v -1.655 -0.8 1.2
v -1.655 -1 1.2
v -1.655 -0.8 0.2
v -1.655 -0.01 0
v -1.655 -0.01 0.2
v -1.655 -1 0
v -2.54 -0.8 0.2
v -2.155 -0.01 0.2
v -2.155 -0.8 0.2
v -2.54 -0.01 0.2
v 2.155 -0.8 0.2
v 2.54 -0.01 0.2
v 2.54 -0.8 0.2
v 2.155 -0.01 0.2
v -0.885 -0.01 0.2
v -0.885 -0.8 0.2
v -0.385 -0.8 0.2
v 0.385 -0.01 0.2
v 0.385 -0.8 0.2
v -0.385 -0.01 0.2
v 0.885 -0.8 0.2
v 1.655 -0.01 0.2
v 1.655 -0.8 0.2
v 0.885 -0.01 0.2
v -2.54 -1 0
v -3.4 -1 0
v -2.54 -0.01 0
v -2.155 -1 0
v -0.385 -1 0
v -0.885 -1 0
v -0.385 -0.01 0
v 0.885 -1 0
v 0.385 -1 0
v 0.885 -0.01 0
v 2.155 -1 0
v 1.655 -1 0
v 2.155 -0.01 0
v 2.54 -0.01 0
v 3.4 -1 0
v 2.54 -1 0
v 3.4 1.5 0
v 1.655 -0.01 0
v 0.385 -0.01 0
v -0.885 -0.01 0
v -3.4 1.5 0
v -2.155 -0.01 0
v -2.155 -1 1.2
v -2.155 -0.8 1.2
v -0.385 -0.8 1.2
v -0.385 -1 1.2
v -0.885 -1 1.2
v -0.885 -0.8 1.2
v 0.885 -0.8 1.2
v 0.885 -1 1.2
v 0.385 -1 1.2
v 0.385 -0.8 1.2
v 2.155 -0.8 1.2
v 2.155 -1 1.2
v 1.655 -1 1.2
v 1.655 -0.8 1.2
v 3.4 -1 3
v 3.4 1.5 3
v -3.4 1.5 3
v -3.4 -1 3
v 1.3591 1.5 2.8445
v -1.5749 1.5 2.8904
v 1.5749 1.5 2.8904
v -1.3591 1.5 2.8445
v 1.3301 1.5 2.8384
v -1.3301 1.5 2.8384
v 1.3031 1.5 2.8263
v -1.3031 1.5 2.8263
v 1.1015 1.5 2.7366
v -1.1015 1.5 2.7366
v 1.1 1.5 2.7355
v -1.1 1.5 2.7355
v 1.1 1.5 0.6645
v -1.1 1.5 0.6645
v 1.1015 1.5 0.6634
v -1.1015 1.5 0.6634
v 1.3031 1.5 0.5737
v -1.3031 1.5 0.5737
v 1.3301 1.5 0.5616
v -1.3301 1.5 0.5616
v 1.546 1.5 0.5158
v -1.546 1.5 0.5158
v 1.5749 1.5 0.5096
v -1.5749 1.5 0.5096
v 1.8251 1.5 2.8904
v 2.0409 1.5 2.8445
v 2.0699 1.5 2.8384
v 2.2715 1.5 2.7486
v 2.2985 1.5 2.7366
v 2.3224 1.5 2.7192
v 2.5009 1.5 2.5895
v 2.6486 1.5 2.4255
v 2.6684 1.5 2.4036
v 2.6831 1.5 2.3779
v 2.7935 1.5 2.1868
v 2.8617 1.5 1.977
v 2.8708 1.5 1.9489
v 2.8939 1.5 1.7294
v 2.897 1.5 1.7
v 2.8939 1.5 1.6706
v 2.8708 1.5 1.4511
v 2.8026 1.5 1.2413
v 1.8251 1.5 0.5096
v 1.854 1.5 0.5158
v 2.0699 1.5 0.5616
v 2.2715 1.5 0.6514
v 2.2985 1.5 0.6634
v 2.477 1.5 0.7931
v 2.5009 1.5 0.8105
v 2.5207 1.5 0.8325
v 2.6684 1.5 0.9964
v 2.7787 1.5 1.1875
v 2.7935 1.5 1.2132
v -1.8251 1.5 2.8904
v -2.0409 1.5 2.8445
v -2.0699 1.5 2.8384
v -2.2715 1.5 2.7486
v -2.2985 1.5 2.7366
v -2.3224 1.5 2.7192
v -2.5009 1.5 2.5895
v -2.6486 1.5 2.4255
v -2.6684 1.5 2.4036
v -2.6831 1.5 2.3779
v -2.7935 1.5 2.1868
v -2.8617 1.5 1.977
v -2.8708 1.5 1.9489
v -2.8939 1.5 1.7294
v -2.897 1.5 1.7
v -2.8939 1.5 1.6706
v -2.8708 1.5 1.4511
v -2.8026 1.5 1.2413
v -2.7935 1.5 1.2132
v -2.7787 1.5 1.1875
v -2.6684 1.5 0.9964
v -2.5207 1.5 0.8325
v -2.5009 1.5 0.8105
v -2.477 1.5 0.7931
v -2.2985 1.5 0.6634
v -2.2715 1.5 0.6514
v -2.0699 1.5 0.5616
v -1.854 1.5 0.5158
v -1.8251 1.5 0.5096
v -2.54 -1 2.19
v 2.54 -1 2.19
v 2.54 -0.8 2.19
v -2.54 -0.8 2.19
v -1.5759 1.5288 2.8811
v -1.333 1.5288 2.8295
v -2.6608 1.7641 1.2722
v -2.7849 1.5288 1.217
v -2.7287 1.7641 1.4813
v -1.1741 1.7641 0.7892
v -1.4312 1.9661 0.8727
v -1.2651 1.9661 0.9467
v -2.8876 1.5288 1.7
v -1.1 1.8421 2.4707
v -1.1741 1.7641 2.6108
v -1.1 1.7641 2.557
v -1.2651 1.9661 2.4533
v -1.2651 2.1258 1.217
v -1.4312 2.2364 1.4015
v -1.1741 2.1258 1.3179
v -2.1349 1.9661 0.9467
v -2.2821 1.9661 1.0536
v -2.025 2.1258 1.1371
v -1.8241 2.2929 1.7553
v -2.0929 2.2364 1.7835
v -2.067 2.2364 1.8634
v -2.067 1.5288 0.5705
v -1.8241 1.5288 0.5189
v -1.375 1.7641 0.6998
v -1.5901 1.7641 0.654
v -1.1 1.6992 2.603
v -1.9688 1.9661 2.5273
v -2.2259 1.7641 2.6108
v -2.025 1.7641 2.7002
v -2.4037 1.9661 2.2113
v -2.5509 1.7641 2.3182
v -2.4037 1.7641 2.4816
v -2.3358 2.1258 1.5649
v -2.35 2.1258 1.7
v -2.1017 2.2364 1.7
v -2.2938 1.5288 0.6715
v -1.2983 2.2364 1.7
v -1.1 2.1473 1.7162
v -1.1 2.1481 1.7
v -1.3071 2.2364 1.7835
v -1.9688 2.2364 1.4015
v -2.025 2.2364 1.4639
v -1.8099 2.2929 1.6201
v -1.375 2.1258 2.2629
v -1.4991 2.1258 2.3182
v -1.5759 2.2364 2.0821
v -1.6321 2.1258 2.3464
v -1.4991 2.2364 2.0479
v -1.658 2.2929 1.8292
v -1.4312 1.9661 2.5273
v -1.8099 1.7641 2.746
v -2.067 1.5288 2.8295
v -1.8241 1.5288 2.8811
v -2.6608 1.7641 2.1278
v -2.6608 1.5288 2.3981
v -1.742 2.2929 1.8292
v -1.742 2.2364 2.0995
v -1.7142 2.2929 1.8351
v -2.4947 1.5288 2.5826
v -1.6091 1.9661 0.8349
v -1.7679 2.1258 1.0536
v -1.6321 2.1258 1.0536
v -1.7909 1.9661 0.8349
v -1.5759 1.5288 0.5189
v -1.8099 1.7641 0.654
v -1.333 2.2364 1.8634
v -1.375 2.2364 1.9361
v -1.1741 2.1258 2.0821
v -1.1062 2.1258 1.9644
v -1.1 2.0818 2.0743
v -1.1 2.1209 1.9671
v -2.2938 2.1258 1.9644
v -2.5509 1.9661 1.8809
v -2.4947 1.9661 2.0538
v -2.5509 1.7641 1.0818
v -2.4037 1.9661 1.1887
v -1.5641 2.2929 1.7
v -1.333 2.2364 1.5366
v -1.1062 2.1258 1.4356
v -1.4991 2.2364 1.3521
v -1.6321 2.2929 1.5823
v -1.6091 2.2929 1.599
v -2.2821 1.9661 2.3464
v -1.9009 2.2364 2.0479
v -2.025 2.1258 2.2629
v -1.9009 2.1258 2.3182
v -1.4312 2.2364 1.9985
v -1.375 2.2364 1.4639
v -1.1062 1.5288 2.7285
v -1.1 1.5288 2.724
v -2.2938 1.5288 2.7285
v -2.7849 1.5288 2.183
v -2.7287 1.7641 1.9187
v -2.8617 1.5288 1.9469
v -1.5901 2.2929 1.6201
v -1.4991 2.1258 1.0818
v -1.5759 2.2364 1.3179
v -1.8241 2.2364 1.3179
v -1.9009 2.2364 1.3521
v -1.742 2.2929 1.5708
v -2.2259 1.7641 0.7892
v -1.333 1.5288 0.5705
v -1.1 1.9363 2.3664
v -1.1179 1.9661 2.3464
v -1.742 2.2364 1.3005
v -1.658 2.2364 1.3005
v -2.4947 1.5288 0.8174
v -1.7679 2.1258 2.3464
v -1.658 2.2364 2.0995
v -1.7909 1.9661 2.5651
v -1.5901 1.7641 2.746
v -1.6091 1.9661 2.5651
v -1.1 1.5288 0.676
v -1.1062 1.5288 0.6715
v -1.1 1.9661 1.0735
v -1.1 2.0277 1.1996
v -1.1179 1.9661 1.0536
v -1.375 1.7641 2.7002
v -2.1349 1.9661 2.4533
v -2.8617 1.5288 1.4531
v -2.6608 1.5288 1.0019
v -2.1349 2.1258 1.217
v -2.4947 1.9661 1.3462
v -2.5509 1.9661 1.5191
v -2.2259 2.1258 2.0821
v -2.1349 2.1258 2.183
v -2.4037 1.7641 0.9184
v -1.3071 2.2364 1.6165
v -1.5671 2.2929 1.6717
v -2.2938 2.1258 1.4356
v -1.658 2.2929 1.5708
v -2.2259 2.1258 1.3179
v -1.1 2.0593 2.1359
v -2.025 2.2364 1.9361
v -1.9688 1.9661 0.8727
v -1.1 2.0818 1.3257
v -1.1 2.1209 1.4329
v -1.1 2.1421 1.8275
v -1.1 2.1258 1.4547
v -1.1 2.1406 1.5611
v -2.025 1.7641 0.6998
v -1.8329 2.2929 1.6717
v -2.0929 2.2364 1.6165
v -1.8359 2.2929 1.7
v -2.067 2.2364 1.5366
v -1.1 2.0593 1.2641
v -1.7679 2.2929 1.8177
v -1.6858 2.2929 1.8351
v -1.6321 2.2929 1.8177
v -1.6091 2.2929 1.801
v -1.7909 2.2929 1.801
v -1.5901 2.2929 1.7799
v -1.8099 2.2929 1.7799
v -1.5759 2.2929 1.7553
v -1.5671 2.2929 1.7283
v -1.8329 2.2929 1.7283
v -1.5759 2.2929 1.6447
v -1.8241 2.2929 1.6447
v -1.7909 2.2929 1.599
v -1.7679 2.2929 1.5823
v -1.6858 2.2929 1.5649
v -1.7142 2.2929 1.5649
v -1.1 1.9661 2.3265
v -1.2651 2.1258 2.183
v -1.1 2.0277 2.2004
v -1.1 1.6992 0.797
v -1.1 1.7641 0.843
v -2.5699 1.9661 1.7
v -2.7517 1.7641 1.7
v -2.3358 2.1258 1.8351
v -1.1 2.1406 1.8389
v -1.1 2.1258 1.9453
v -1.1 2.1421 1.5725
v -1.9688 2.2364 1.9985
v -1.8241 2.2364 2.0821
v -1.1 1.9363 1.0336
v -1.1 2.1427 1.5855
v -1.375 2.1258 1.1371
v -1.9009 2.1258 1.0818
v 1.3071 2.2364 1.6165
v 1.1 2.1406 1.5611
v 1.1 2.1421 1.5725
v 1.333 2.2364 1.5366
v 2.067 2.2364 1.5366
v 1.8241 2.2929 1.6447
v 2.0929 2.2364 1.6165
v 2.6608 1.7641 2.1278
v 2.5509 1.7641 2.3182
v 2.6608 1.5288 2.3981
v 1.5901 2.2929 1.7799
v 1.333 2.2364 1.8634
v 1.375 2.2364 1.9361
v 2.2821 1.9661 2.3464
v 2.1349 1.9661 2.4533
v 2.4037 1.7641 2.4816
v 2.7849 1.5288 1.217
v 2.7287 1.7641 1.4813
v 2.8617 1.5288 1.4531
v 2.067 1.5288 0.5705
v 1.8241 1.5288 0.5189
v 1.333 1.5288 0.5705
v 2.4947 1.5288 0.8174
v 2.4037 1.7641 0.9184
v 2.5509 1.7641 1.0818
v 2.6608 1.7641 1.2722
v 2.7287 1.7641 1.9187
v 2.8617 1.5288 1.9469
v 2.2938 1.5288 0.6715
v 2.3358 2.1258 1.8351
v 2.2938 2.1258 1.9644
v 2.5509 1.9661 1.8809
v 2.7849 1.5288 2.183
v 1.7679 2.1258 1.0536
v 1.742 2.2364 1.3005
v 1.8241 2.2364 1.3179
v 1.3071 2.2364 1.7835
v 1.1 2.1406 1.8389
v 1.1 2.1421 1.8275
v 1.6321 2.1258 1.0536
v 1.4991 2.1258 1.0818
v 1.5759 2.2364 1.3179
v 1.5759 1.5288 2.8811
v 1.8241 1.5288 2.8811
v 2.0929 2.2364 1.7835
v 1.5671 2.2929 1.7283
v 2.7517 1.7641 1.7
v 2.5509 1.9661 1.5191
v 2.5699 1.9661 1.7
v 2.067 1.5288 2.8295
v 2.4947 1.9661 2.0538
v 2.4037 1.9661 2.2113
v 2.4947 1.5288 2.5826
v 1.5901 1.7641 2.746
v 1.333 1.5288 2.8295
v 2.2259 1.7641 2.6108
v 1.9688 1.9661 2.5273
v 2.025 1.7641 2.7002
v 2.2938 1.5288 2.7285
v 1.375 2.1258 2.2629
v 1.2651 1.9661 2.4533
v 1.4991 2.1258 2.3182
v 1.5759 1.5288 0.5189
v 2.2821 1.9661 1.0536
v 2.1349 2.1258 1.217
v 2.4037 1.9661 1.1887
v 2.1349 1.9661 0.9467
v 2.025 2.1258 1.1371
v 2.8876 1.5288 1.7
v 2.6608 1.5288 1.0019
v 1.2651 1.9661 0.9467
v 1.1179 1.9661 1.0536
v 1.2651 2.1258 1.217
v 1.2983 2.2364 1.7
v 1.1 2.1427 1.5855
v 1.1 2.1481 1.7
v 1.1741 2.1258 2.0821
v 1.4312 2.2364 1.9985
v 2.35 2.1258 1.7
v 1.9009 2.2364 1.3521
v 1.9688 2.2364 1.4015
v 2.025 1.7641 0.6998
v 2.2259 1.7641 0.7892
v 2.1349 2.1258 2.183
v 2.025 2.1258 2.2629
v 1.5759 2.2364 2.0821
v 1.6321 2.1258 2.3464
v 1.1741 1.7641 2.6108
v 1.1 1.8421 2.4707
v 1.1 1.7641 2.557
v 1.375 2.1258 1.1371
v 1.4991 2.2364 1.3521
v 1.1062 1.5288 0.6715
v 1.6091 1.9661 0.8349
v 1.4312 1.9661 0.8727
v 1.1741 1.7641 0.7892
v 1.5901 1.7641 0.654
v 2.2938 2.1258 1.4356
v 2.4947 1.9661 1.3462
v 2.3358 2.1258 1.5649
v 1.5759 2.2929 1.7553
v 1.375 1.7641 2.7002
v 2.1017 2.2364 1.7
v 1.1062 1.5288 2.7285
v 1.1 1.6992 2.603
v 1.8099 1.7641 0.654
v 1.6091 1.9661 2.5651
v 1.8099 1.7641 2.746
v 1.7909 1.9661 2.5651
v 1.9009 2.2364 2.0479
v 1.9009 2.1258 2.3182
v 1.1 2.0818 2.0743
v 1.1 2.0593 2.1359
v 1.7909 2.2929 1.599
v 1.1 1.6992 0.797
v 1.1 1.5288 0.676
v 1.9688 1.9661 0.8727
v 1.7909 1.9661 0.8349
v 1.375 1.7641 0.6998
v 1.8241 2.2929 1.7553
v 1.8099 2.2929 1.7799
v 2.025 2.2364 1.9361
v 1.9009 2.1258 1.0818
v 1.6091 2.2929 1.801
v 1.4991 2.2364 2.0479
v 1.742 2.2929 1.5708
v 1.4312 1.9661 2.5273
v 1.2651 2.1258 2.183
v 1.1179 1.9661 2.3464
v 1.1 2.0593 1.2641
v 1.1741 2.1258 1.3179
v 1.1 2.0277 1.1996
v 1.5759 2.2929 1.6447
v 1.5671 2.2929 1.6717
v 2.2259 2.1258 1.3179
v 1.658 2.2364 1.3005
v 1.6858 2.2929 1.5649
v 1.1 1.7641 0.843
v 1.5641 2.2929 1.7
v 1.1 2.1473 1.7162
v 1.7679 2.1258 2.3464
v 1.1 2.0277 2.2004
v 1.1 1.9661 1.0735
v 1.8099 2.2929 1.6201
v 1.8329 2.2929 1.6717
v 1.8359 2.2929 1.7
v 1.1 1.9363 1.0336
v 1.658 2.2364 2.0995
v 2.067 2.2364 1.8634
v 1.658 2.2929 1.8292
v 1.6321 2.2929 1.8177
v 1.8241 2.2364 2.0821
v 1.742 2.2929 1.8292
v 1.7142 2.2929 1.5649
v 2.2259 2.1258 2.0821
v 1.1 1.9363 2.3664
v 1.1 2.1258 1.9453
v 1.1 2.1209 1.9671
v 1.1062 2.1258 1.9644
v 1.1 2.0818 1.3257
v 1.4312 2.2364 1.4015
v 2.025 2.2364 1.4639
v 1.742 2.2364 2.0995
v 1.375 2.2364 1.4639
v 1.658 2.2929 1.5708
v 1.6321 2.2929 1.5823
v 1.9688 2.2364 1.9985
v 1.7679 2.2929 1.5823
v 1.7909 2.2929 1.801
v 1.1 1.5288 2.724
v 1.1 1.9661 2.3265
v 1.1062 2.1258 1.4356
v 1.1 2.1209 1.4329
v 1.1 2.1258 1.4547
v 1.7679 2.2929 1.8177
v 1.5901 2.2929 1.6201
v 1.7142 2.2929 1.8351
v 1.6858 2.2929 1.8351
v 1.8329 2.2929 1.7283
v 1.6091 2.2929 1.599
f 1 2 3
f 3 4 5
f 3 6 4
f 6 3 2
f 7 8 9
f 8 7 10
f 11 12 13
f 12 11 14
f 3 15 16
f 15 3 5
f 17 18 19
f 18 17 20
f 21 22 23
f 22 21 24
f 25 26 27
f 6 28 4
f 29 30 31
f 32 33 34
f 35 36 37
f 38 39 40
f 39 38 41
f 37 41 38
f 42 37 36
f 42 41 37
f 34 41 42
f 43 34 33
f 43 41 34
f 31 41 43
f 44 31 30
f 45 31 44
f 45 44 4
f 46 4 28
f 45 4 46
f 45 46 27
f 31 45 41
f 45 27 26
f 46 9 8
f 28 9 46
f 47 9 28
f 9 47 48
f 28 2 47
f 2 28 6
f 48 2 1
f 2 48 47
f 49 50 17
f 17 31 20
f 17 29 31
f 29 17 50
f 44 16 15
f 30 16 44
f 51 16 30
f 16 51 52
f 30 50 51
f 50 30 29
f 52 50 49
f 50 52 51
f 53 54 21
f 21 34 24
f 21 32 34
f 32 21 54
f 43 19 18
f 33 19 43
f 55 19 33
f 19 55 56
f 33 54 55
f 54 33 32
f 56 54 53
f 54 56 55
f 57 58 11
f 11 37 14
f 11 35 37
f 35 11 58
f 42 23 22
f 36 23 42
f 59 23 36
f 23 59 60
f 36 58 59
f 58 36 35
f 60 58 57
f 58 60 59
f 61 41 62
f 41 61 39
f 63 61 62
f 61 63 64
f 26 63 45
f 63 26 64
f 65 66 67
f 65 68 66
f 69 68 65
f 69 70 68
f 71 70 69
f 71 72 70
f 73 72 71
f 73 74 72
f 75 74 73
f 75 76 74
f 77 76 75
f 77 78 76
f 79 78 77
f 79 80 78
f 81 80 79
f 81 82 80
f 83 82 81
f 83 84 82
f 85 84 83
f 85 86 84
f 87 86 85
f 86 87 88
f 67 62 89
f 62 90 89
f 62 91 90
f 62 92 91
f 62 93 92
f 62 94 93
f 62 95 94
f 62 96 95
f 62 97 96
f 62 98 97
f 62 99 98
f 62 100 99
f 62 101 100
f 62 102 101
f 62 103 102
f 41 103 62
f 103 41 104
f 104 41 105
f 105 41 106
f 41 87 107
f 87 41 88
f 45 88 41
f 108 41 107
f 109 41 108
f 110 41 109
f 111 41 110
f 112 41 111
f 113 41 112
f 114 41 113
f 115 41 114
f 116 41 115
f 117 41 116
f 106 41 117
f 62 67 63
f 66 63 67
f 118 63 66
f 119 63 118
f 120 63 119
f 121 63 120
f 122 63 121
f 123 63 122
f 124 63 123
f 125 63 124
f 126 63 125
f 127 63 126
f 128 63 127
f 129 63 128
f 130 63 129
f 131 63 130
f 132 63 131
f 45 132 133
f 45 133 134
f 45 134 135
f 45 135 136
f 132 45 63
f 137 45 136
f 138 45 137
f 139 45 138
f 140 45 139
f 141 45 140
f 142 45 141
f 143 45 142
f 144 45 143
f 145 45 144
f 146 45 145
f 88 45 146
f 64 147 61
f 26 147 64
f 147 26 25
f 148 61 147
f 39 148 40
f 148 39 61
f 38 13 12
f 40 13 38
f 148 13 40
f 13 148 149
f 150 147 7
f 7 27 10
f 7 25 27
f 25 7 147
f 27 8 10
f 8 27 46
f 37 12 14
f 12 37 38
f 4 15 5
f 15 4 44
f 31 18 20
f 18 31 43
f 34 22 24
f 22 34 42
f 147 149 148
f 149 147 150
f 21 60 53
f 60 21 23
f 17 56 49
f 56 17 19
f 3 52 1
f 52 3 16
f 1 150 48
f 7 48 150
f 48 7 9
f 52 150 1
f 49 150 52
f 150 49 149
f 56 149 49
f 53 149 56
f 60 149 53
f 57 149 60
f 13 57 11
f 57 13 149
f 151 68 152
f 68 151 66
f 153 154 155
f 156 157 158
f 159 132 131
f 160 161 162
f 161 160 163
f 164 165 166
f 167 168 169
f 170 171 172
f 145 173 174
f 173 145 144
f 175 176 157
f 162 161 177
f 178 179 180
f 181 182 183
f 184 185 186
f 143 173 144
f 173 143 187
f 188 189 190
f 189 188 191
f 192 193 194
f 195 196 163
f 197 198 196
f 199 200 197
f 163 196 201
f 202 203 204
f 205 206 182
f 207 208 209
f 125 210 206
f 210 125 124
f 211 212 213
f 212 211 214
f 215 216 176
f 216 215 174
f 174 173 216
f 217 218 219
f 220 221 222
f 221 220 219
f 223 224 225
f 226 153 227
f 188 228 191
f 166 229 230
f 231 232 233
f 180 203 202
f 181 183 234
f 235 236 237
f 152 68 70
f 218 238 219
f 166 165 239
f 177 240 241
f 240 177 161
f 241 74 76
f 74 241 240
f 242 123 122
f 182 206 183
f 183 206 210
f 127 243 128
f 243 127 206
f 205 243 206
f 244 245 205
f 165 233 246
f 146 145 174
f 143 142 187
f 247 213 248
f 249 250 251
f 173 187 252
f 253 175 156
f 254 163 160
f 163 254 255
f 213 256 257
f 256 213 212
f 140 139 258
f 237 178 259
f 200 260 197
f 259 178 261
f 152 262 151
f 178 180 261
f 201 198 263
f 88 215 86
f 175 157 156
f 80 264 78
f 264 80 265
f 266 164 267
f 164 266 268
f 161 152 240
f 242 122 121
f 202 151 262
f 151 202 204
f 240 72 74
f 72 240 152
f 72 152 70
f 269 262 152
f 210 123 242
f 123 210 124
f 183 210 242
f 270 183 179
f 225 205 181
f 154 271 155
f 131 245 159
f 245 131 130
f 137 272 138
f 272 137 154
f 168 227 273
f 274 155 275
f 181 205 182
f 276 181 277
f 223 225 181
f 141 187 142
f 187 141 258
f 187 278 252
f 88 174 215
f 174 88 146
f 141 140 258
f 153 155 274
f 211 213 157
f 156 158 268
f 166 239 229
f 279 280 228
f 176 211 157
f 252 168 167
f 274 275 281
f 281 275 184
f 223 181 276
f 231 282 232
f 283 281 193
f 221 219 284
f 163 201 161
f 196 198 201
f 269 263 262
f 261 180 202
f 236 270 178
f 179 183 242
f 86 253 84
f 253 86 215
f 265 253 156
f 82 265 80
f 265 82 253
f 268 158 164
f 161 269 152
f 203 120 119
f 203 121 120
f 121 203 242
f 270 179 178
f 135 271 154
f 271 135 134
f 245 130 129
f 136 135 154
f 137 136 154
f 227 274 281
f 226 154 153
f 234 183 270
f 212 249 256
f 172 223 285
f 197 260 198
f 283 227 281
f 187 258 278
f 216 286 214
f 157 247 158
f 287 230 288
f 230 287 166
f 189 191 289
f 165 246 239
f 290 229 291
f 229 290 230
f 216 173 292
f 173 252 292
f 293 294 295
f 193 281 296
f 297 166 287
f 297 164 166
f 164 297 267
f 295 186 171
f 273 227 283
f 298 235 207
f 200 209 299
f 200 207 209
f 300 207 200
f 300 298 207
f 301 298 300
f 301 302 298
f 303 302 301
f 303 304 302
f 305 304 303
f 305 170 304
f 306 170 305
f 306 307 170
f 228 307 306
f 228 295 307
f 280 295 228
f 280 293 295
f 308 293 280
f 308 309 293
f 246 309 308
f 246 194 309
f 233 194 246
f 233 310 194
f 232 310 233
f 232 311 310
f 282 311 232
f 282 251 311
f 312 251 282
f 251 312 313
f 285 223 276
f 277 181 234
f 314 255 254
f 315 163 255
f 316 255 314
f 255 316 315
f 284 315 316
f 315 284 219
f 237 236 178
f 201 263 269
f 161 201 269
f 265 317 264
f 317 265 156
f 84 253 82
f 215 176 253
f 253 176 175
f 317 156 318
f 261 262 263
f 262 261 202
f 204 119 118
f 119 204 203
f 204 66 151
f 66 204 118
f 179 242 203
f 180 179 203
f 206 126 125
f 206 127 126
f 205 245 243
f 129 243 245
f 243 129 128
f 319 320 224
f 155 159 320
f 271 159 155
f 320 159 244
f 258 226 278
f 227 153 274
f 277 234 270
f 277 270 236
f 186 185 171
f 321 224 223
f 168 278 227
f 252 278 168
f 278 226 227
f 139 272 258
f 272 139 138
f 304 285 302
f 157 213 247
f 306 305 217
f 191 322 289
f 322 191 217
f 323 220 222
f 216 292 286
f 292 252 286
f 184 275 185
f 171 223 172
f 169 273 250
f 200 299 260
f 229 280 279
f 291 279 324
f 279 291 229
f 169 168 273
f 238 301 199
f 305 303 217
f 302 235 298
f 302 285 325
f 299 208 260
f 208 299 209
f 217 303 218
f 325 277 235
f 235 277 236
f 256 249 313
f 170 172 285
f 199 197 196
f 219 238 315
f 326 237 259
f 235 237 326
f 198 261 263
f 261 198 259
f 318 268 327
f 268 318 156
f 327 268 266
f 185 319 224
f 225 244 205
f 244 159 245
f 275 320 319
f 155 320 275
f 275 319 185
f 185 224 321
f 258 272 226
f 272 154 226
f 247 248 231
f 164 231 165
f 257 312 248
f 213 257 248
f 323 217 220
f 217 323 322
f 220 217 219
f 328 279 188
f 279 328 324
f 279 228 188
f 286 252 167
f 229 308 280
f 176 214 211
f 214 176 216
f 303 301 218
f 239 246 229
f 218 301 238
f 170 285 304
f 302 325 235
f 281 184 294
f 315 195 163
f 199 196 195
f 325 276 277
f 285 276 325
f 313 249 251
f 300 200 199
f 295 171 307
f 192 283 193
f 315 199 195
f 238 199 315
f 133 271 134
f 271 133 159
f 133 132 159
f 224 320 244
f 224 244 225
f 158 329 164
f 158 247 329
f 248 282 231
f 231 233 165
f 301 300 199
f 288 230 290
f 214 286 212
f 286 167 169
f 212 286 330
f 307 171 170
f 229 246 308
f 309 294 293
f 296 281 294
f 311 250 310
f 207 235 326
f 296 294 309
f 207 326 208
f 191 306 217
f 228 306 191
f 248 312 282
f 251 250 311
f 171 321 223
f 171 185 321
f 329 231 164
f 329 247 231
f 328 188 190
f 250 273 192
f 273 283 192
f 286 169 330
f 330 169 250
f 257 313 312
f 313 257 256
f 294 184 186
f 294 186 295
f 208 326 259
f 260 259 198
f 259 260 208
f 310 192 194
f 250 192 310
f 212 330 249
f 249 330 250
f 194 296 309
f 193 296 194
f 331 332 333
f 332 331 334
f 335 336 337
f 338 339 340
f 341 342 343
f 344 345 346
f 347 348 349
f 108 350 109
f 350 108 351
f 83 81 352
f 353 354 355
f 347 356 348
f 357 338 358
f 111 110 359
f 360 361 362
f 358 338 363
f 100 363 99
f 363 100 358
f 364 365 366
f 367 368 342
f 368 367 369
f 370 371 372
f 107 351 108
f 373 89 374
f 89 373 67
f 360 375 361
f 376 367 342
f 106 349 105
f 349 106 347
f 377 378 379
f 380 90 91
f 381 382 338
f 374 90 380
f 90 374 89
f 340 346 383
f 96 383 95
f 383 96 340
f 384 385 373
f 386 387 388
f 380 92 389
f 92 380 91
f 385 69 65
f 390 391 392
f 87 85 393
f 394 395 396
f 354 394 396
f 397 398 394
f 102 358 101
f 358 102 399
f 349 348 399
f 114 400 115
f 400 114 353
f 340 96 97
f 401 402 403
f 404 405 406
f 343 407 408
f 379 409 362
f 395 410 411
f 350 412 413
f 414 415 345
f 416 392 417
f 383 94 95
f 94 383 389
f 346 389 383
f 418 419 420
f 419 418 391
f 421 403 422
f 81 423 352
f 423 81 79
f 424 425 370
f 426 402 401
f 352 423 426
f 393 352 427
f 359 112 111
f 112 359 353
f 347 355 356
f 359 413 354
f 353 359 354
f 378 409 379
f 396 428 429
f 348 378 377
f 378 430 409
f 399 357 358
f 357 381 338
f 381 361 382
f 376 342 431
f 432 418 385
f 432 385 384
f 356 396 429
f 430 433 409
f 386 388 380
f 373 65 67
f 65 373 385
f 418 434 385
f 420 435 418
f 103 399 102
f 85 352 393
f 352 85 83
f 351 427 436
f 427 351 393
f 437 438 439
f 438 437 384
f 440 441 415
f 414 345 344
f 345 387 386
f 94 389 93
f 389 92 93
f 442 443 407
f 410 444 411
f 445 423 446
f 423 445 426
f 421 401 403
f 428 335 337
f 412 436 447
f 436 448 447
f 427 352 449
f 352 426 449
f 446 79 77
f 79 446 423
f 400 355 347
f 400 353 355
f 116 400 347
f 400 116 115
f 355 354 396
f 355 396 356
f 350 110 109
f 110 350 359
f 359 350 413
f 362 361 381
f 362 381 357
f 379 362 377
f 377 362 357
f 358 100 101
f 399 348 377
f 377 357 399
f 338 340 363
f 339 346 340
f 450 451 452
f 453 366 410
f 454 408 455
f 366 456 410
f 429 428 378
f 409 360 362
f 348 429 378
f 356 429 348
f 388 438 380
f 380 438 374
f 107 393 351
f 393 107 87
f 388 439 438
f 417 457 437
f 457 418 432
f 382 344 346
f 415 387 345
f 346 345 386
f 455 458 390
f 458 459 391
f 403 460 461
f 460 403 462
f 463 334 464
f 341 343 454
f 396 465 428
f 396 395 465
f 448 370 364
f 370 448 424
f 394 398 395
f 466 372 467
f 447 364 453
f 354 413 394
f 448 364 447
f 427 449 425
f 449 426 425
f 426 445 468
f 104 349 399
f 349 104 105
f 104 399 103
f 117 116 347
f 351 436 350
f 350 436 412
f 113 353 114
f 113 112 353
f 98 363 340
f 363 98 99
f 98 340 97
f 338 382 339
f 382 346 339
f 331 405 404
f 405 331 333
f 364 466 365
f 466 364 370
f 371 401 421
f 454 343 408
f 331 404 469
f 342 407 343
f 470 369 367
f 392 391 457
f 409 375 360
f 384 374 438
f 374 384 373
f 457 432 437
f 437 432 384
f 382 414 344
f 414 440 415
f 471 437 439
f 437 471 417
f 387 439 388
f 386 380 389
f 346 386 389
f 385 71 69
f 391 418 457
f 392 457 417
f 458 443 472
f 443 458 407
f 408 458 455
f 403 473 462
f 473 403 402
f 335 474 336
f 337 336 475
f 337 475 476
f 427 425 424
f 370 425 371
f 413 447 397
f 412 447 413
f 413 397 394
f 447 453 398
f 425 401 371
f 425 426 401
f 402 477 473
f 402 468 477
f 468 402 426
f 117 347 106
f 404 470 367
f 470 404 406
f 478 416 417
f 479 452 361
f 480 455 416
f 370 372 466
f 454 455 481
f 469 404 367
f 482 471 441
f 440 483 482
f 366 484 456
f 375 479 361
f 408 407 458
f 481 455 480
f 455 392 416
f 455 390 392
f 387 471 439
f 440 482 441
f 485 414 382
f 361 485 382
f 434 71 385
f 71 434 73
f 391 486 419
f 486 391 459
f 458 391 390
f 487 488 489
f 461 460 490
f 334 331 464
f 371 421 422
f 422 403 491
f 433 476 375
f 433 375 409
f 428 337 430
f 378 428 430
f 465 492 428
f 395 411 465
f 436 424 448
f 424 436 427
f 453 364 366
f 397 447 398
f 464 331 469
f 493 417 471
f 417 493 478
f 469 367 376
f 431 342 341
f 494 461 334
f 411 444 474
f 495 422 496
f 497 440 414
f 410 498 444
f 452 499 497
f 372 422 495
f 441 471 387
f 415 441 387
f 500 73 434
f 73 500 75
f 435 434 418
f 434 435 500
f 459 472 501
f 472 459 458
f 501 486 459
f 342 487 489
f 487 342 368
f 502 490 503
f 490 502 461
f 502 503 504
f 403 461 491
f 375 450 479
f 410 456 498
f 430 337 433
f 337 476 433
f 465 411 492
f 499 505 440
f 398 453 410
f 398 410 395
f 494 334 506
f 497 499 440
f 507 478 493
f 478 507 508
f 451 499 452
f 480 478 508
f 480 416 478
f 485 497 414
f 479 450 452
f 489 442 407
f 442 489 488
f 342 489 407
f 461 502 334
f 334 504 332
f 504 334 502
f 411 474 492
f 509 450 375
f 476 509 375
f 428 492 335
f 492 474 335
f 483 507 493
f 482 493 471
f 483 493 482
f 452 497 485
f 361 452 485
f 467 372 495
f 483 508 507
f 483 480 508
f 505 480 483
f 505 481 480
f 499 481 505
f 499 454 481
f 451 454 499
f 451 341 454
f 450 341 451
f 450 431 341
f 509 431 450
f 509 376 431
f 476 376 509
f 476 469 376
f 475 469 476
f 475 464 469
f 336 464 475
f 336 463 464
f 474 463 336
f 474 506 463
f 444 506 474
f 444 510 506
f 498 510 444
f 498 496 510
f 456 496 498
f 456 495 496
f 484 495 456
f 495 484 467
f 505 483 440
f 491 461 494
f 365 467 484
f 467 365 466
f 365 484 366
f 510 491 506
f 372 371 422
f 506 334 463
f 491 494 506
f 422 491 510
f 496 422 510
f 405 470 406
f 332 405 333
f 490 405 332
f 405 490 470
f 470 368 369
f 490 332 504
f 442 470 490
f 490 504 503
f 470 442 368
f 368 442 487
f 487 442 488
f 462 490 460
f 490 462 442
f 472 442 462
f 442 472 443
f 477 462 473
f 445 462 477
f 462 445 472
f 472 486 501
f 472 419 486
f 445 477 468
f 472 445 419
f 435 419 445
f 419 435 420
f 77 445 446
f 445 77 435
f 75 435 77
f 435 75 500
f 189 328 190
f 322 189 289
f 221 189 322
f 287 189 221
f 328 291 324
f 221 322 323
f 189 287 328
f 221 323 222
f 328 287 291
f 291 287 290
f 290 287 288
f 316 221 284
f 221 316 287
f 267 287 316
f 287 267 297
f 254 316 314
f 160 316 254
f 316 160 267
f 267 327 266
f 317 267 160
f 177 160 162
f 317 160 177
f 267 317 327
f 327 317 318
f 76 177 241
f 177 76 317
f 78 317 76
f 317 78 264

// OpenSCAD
pins_per_row = 4;
pin_step = 1.27;
pin_w = 0.5;
pin_th = 0.2;
pin_l = 1;
pin_h = 1.2;

delta = 0.01;

case_w = 6.8;
case_l = 2.5;
case_h = 3;
case_co_rear = case_h - 0.8;
lens_r = 1.3;
lens_h = 1.7;
lens_dist = 3.4;
lens_off_y = 1;
lens_co_w = 2.2;

module pin(_x,_y,_z)
{
	translate([-_x/2,-_y/2,0])
		cube([_x,_y,_z]);
};

module pins_array(_cnt, _distance)
{
    translate([-_distance*(_cnt-1)/2,0,0])
	if (_cnt>0)
	{
		for (_i = [0:_cnt-1])
		{
            color("#F0B030")
                translate([_distance*_i,-pin_l/2,0])
                    pin(pin_w,pin_l,pin_th);
            color("#F0B030")
                translate([_distance*_i,-pin_l+pin_th,pin_h/2])
                    rotate([90,0,0])
                        pin(pin_w,pin_h,pin_th);
		}
	}
}

module case()
{
    translate([0,-pin_l,0])
    difference()
    {
        color("#303030")
            translate([-case_w/2,0,0])
                cube([case_w,case_l,case_h]);

        color("#303030")
        translate([-pins_per_row*pin_step/2,-delta,-delta])
            cube([pins_per_row*pin_step,pin_l,pin_th+delta]);

        color("#303030")
            translate([-pins_per_row*pin_step/2,-delta,-delta])
                cube([pins_per_row*pin_step,pin_th+delta,case_co_rear]);
    }
    difference()
    {
        union()
        {
            color("#303030")
                translate([-lens_dist/2,lens_off_y,lens_h])
                    rotate([90,0,0])
                        sphere(r=lens_r, $fn=30);
            color("#303030")
                translate([lens_dist/2,lens_off_y,lens_h])
                    rotate([90,0,0])
                        sphere(r=lens_r, $fn=30);
            
        }
        color("#303030")
            translate([-lens_co_w/2,lens_off_y-lens_r,0])
                cube([lens_co_w,lens_r*2,case_h]);
    }
}

union()
{   
    // Array1 of pins
    pins_array(pins_per_row,pin_step);
    
    // Draw case
    case();
};
